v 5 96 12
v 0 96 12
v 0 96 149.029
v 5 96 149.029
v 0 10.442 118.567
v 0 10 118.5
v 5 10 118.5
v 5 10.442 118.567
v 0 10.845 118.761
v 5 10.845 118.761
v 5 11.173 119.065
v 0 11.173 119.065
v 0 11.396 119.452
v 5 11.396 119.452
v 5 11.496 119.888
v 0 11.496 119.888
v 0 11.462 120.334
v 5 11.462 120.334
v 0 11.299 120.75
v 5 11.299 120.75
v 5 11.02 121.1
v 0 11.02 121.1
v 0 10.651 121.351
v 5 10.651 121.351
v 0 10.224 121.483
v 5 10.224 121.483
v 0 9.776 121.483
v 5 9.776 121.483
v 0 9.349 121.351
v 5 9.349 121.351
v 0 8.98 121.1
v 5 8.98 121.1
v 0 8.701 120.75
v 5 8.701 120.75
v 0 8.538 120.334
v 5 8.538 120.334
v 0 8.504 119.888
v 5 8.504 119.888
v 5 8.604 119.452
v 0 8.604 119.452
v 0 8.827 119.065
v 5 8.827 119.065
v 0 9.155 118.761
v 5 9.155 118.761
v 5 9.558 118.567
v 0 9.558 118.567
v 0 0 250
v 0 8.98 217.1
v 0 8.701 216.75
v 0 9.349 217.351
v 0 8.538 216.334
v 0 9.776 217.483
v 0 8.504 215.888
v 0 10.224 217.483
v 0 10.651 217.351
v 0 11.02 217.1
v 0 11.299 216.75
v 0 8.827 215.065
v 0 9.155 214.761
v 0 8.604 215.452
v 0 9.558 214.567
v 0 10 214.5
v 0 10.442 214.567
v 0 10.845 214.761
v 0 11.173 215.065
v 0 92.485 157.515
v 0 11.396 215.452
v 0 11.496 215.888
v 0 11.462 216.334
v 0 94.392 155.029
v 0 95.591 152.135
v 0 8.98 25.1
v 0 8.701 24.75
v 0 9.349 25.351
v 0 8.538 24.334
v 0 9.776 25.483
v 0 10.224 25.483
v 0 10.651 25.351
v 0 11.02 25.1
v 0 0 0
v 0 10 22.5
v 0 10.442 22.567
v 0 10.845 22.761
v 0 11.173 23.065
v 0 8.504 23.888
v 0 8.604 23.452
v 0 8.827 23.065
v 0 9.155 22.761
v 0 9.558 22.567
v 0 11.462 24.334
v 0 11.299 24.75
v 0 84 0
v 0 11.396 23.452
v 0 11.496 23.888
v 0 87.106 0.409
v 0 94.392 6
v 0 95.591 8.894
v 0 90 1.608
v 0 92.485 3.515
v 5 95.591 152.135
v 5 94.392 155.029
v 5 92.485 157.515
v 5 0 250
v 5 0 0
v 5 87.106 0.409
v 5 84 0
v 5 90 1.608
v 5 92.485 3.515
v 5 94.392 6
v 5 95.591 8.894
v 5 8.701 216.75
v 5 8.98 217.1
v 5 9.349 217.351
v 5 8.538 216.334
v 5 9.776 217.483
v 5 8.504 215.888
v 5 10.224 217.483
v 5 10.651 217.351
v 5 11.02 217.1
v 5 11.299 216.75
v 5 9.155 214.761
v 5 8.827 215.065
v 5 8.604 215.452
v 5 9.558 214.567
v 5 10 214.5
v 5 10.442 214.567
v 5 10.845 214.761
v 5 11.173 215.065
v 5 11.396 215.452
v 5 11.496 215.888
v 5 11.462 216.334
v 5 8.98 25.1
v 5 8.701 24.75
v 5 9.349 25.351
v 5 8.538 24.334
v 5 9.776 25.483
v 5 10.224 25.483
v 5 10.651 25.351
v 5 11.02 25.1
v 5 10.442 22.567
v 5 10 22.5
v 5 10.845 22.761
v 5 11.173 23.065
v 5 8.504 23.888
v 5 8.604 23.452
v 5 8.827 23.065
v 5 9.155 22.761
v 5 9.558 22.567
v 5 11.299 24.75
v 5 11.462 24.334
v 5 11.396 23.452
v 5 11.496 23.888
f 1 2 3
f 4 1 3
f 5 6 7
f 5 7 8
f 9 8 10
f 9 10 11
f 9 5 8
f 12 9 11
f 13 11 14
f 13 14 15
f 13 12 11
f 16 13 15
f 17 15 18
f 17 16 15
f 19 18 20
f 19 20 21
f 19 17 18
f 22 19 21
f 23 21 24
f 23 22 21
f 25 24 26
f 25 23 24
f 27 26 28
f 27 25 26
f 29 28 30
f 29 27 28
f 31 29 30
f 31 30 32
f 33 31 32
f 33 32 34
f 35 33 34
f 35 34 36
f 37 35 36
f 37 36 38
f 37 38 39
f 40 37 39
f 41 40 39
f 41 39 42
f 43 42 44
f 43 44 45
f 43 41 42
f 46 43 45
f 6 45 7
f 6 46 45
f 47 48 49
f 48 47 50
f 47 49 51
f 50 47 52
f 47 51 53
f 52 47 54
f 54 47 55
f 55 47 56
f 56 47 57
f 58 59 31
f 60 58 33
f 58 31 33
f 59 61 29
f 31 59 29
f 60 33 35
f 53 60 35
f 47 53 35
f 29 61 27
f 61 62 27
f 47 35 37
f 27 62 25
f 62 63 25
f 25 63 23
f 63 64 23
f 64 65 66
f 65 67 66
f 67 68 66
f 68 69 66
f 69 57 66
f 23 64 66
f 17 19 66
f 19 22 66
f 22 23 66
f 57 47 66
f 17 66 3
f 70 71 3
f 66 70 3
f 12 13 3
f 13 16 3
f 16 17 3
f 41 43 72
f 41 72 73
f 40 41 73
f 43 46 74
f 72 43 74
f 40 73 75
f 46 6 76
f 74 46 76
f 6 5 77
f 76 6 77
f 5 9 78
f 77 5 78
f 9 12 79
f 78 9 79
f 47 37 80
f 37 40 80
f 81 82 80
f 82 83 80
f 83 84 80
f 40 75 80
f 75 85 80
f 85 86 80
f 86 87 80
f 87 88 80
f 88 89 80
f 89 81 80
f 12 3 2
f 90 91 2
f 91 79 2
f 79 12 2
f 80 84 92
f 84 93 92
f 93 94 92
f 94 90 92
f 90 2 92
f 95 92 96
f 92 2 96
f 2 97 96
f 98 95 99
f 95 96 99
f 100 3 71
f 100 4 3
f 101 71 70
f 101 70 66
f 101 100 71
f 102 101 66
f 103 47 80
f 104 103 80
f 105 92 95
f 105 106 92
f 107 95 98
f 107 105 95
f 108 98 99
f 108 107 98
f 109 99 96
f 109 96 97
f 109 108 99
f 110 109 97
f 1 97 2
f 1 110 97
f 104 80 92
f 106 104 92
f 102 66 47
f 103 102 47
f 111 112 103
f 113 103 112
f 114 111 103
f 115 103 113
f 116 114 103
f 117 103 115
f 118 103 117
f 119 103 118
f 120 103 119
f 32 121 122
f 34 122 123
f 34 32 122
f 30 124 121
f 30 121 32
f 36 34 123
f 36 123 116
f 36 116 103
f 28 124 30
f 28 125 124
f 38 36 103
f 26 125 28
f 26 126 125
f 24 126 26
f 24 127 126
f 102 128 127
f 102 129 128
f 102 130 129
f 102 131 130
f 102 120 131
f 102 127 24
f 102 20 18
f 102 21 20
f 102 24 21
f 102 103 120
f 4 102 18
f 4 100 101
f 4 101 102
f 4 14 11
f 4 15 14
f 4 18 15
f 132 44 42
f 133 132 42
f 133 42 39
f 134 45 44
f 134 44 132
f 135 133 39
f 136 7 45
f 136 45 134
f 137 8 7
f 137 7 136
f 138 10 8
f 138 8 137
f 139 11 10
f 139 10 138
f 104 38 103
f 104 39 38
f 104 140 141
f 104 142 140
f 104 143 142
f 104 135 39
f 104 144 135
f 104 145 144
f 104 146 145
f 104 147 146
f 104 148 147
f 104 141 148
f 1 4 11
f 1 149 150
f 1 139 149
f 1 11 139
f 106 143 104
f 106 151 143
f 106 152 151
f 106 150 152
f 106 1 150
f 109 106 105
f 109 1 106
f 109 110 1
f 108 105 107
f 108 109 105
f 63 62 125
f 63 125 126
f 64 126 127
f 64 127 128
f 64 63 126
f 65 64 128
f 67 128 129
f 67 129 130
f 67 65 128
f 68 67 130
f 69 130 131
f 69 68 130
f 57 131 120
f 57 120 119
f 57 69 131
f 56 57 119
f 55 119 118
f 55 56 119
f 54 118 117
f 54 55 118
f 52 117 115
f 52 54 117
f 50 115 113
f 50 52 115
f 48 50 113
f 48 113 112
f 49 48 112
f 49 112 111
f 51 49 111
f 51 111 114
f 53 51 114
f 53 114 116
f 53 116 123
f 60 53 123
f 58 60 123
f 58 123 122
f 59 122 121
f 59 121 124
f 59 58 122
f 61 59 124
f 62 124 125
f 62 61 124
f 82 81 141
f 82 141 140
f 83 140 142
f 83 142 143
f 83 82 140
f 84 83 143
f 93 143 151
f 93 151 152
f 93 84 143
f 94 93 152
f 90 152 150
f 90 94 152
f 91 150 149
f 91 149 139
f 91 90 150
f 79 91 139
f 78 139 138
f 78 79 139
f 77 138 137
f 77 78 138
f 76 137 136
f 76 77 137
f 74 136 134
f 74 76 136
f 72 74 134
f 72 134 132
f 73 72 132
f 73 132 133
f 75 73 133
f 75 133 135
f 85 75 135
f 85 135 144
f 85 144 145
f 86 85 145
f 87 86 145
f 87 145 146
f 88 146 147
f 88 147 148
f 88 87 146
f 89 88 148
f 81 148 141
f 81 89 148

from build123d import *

# Parameters (mm, degrees)
SKETCH1_R           = 1.5
BOSS_EXTRUDE1_DEPTH = 5
FILLET1_R           = 12


with BuildPart() as part:
    # Sketch1 → Boss-Extrude1 (new body)
    with BuildSketch(Plane(origin=(0, 0, 0), x_dir=(0, 0, -1), z_dir=(1, 0, 0))):
        Polygon((0, 0), (0, 96), (-154, 96), (-250, 0), align=None)
        with Locations((-120, 10)):
            Circle(SKETCH1_R, mode=Mode.SUBTRACT)
        with Locations((-24, 10)):
            Circle(SKETCH1_R, mode=Mode.SUBTRACT)
        with Locations((-216, 10)):
            Circle(SKETCH1_R, mode=Mode.SUBTRACT)
    extrude(amount=BOSS_EXTRUDE1_DEPTH)

    # Fillet1
    fillet1_edges = [part.edges().sort_by_distance(p)[0] for p in [
        (2.5, 96, 154),
        (2.5, 96, 0),
    ]]
    fillet(fillet1_edges, radius=FILLET1_R)


solid = part.part
